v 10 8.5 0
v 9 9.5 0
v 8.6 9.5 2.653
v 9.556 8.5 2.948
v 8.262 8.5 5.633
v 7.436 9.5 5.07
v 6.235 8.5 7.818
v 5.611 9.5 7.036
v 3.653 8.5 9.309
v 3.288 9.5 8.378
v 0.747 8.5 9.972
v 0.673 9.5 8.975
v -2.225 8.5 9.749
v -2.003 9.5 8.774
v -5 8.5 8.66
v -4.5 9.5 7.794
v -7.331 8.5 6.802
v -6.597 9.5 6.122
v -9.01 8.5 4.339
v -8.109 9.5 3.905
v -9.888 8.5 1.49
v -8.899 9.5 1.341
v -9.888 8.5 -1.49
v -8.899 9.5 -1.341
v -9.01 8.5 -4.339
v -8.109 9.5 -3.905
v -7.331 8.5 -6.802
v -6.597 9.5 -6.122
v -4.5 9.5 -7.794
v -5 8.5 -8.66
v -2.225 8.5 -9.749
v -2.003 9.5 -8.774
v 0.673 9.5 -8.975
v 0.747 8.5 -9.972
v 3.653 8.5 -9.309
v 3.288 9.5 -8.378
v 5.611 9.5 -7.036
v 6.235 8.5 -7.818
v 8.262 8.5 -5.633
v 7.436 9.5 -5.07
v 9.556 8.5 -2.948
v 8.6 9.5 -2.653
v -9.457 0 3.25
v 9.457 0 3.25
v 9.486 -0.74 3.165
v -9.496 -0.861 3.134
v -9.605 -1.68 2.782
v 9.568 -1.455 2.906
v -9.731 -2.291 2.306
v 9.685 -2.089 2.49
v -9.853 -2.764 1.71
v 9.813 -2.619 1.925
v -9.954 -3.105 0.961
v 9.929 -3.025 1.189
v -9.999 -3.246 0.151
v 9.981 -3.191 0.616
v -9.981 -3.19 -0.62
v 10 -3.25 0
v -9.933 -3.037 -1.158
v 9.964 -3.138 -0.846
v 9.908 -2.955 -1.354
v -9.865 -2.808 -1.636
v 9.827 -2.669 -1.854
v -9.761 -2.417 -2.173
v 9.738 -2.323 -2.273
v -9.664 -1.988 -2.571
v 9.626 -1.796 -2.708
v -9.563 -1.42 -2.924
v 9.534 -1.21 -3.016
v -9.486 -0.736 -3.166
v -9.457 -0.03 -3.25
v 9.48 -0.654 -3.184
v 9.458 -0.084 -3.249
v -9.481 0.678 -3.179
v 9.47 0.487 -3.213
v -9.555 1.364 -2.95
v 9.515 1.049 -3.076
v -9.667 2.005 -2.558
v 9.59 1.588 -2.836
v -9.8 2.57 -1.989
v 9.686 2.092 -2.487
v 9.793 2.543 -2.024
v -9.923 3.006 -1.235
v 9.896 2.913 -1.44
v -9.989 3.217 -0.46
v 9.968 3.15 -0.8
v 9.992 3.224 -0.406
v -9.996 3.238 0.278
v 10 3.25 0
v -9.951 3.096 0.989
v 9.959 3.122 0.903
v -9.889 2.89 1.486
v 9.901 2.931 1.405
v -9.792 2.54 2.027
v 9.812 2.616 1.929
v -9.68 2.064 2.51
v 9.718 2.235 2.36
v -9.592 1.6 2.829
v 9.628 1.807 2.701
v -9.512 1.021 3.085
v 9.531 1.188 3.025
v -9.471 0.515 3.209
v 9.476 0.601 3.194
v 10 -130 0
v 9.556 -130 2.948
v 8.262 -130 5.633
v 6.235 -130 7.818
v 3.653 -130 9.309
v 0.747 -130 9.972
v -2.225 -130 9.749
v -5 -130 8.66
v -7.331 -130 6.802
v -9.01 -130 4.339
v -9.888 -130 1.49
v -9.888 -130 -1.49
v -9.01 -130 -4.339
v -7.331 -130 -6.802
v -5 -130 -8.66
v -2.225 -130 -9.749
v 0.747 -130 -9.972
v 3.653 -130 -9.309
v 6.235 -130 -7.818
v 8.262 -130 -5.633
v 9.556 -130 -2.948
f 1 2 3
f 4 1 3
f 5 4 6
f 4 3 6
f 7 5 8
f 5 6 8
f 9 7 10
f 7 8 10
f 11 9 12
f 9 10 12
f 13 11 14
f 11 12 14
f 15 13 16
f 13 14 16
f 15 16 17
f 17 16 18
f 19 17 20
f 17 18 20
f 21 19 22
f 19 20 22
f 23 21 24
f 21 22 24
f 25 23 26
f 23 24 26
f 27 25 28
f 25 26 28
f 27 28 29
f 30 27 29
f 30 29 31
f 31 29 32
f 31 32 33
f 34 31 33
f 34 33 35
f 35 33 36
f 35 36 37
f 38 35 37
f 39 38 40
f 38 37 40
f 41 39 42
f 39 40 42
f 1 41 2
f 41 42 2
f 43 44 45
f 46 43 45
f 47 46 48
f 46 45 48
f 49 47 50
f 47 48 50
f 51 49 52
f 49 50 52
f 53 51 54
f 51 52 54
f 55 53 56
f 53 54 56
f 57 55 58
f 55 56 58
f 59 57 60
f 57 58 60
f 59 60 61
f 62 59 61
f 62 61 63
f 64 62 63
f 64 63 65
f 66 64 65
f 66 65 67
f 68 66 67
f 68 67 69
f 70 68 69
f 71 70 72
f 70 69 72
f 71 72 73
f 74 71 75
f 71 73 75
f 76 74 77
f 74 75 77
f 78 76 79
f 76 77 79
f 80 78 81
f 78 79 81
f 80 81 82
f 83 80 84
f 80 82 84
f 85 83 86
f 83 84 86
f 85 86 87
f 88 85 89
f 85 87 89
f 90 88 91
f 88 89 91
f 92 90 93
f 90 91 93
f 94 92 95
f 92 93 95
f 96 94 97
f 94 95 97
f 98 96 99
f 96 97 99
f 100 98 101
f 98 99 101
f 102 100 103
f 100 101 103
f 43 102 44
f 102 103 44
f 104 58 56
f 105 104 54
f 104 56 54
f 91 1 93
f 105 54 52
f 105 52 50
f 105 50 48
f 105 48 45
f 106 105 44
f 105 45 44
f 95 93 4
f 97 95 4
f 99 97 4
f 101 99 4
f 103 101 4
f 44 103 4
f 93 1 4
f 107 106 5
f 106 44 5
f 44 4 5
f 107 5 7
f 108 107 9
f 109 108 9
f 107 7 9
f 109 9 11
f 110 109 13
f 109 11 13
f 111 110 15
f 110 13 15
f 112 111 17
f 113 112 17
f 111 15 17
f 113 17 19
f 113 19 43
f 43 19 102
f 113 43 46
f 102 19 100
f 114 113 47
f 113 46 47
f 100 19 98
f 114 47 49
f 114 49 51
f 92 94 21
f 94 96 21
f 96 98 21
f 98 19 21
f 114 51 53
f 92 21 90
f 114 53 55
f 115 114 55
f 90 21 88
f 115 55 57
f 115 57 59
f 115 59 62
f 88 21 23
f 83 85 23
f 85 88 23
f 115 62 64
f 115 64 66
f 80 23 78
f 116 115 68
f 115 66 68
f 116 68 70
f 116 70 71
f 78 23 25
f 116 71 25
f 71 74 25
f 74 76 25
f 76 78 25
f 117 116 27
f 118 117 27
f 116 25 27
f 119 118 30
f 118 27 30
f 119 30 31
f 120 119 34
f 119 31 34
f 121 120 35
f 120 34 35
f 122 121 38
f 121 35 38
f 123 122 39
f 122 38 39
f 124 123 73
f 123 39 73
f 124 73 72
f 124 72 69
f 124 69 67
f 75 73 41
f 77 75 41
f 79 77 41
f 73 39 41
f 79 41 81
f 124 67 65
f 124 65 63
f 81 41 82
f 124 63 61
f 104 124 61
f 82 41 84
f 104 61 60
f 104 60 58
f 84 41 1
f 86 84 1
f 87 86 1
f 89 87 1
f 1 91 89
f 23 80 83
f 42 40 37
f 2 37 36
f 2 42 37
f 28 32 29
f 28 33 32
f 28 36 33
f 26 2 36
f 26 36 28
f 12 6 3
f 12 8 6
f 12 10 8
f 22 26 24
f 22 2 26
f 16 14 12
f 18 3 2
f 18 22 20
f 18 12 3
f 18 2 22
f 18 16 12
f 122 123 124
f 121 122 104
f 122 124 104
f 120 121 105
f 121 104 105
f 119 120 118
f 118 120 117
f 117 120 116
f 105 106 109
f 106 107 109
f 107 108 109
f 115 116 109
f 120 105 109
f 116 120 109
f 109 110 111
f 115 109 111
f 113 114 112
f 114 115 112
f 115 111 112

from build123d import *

# Parameters (mm, degrees)
SKETCH_1_W              = 10
SKETCH_1_H              = 139.5
HOLE_WIZARD_6_5_6_5_1_D = 6.5
CHAMFER_1_SIZE          = 1


with BuildPart() as part:
    # 草图1 → 旋转1 (revolve)
    with BuildSketch(Plane.XY):
        with Locations((5, -60.25)):
            Rectangle(SKETCH_1_W, SKETCH_1_H)
    revolve(axis=Axis((0, 9.5, 0), (0, -1, 0)))

    # Ø6.5 (6.5) 直径孔1 (through all)
    with Locations(Plane(origin=(-10, 0, 0), x_dir=(0, 0, -1), z_dir=(-1, 0, 0))):
        with Locations((0, 0)):
            Hole(HOLE_WIZARD_6_5_6_5_1_D / 2)

    # 倒角1
    chamfer_1_edges = [part.edges().sort_by_distance(p)[0] for p in [
        (-10, 9.5, 0),
    ]]
    chamfer(chamfer_1_edges, length=CHAMFER_1_SIZE)


solid = part.part
